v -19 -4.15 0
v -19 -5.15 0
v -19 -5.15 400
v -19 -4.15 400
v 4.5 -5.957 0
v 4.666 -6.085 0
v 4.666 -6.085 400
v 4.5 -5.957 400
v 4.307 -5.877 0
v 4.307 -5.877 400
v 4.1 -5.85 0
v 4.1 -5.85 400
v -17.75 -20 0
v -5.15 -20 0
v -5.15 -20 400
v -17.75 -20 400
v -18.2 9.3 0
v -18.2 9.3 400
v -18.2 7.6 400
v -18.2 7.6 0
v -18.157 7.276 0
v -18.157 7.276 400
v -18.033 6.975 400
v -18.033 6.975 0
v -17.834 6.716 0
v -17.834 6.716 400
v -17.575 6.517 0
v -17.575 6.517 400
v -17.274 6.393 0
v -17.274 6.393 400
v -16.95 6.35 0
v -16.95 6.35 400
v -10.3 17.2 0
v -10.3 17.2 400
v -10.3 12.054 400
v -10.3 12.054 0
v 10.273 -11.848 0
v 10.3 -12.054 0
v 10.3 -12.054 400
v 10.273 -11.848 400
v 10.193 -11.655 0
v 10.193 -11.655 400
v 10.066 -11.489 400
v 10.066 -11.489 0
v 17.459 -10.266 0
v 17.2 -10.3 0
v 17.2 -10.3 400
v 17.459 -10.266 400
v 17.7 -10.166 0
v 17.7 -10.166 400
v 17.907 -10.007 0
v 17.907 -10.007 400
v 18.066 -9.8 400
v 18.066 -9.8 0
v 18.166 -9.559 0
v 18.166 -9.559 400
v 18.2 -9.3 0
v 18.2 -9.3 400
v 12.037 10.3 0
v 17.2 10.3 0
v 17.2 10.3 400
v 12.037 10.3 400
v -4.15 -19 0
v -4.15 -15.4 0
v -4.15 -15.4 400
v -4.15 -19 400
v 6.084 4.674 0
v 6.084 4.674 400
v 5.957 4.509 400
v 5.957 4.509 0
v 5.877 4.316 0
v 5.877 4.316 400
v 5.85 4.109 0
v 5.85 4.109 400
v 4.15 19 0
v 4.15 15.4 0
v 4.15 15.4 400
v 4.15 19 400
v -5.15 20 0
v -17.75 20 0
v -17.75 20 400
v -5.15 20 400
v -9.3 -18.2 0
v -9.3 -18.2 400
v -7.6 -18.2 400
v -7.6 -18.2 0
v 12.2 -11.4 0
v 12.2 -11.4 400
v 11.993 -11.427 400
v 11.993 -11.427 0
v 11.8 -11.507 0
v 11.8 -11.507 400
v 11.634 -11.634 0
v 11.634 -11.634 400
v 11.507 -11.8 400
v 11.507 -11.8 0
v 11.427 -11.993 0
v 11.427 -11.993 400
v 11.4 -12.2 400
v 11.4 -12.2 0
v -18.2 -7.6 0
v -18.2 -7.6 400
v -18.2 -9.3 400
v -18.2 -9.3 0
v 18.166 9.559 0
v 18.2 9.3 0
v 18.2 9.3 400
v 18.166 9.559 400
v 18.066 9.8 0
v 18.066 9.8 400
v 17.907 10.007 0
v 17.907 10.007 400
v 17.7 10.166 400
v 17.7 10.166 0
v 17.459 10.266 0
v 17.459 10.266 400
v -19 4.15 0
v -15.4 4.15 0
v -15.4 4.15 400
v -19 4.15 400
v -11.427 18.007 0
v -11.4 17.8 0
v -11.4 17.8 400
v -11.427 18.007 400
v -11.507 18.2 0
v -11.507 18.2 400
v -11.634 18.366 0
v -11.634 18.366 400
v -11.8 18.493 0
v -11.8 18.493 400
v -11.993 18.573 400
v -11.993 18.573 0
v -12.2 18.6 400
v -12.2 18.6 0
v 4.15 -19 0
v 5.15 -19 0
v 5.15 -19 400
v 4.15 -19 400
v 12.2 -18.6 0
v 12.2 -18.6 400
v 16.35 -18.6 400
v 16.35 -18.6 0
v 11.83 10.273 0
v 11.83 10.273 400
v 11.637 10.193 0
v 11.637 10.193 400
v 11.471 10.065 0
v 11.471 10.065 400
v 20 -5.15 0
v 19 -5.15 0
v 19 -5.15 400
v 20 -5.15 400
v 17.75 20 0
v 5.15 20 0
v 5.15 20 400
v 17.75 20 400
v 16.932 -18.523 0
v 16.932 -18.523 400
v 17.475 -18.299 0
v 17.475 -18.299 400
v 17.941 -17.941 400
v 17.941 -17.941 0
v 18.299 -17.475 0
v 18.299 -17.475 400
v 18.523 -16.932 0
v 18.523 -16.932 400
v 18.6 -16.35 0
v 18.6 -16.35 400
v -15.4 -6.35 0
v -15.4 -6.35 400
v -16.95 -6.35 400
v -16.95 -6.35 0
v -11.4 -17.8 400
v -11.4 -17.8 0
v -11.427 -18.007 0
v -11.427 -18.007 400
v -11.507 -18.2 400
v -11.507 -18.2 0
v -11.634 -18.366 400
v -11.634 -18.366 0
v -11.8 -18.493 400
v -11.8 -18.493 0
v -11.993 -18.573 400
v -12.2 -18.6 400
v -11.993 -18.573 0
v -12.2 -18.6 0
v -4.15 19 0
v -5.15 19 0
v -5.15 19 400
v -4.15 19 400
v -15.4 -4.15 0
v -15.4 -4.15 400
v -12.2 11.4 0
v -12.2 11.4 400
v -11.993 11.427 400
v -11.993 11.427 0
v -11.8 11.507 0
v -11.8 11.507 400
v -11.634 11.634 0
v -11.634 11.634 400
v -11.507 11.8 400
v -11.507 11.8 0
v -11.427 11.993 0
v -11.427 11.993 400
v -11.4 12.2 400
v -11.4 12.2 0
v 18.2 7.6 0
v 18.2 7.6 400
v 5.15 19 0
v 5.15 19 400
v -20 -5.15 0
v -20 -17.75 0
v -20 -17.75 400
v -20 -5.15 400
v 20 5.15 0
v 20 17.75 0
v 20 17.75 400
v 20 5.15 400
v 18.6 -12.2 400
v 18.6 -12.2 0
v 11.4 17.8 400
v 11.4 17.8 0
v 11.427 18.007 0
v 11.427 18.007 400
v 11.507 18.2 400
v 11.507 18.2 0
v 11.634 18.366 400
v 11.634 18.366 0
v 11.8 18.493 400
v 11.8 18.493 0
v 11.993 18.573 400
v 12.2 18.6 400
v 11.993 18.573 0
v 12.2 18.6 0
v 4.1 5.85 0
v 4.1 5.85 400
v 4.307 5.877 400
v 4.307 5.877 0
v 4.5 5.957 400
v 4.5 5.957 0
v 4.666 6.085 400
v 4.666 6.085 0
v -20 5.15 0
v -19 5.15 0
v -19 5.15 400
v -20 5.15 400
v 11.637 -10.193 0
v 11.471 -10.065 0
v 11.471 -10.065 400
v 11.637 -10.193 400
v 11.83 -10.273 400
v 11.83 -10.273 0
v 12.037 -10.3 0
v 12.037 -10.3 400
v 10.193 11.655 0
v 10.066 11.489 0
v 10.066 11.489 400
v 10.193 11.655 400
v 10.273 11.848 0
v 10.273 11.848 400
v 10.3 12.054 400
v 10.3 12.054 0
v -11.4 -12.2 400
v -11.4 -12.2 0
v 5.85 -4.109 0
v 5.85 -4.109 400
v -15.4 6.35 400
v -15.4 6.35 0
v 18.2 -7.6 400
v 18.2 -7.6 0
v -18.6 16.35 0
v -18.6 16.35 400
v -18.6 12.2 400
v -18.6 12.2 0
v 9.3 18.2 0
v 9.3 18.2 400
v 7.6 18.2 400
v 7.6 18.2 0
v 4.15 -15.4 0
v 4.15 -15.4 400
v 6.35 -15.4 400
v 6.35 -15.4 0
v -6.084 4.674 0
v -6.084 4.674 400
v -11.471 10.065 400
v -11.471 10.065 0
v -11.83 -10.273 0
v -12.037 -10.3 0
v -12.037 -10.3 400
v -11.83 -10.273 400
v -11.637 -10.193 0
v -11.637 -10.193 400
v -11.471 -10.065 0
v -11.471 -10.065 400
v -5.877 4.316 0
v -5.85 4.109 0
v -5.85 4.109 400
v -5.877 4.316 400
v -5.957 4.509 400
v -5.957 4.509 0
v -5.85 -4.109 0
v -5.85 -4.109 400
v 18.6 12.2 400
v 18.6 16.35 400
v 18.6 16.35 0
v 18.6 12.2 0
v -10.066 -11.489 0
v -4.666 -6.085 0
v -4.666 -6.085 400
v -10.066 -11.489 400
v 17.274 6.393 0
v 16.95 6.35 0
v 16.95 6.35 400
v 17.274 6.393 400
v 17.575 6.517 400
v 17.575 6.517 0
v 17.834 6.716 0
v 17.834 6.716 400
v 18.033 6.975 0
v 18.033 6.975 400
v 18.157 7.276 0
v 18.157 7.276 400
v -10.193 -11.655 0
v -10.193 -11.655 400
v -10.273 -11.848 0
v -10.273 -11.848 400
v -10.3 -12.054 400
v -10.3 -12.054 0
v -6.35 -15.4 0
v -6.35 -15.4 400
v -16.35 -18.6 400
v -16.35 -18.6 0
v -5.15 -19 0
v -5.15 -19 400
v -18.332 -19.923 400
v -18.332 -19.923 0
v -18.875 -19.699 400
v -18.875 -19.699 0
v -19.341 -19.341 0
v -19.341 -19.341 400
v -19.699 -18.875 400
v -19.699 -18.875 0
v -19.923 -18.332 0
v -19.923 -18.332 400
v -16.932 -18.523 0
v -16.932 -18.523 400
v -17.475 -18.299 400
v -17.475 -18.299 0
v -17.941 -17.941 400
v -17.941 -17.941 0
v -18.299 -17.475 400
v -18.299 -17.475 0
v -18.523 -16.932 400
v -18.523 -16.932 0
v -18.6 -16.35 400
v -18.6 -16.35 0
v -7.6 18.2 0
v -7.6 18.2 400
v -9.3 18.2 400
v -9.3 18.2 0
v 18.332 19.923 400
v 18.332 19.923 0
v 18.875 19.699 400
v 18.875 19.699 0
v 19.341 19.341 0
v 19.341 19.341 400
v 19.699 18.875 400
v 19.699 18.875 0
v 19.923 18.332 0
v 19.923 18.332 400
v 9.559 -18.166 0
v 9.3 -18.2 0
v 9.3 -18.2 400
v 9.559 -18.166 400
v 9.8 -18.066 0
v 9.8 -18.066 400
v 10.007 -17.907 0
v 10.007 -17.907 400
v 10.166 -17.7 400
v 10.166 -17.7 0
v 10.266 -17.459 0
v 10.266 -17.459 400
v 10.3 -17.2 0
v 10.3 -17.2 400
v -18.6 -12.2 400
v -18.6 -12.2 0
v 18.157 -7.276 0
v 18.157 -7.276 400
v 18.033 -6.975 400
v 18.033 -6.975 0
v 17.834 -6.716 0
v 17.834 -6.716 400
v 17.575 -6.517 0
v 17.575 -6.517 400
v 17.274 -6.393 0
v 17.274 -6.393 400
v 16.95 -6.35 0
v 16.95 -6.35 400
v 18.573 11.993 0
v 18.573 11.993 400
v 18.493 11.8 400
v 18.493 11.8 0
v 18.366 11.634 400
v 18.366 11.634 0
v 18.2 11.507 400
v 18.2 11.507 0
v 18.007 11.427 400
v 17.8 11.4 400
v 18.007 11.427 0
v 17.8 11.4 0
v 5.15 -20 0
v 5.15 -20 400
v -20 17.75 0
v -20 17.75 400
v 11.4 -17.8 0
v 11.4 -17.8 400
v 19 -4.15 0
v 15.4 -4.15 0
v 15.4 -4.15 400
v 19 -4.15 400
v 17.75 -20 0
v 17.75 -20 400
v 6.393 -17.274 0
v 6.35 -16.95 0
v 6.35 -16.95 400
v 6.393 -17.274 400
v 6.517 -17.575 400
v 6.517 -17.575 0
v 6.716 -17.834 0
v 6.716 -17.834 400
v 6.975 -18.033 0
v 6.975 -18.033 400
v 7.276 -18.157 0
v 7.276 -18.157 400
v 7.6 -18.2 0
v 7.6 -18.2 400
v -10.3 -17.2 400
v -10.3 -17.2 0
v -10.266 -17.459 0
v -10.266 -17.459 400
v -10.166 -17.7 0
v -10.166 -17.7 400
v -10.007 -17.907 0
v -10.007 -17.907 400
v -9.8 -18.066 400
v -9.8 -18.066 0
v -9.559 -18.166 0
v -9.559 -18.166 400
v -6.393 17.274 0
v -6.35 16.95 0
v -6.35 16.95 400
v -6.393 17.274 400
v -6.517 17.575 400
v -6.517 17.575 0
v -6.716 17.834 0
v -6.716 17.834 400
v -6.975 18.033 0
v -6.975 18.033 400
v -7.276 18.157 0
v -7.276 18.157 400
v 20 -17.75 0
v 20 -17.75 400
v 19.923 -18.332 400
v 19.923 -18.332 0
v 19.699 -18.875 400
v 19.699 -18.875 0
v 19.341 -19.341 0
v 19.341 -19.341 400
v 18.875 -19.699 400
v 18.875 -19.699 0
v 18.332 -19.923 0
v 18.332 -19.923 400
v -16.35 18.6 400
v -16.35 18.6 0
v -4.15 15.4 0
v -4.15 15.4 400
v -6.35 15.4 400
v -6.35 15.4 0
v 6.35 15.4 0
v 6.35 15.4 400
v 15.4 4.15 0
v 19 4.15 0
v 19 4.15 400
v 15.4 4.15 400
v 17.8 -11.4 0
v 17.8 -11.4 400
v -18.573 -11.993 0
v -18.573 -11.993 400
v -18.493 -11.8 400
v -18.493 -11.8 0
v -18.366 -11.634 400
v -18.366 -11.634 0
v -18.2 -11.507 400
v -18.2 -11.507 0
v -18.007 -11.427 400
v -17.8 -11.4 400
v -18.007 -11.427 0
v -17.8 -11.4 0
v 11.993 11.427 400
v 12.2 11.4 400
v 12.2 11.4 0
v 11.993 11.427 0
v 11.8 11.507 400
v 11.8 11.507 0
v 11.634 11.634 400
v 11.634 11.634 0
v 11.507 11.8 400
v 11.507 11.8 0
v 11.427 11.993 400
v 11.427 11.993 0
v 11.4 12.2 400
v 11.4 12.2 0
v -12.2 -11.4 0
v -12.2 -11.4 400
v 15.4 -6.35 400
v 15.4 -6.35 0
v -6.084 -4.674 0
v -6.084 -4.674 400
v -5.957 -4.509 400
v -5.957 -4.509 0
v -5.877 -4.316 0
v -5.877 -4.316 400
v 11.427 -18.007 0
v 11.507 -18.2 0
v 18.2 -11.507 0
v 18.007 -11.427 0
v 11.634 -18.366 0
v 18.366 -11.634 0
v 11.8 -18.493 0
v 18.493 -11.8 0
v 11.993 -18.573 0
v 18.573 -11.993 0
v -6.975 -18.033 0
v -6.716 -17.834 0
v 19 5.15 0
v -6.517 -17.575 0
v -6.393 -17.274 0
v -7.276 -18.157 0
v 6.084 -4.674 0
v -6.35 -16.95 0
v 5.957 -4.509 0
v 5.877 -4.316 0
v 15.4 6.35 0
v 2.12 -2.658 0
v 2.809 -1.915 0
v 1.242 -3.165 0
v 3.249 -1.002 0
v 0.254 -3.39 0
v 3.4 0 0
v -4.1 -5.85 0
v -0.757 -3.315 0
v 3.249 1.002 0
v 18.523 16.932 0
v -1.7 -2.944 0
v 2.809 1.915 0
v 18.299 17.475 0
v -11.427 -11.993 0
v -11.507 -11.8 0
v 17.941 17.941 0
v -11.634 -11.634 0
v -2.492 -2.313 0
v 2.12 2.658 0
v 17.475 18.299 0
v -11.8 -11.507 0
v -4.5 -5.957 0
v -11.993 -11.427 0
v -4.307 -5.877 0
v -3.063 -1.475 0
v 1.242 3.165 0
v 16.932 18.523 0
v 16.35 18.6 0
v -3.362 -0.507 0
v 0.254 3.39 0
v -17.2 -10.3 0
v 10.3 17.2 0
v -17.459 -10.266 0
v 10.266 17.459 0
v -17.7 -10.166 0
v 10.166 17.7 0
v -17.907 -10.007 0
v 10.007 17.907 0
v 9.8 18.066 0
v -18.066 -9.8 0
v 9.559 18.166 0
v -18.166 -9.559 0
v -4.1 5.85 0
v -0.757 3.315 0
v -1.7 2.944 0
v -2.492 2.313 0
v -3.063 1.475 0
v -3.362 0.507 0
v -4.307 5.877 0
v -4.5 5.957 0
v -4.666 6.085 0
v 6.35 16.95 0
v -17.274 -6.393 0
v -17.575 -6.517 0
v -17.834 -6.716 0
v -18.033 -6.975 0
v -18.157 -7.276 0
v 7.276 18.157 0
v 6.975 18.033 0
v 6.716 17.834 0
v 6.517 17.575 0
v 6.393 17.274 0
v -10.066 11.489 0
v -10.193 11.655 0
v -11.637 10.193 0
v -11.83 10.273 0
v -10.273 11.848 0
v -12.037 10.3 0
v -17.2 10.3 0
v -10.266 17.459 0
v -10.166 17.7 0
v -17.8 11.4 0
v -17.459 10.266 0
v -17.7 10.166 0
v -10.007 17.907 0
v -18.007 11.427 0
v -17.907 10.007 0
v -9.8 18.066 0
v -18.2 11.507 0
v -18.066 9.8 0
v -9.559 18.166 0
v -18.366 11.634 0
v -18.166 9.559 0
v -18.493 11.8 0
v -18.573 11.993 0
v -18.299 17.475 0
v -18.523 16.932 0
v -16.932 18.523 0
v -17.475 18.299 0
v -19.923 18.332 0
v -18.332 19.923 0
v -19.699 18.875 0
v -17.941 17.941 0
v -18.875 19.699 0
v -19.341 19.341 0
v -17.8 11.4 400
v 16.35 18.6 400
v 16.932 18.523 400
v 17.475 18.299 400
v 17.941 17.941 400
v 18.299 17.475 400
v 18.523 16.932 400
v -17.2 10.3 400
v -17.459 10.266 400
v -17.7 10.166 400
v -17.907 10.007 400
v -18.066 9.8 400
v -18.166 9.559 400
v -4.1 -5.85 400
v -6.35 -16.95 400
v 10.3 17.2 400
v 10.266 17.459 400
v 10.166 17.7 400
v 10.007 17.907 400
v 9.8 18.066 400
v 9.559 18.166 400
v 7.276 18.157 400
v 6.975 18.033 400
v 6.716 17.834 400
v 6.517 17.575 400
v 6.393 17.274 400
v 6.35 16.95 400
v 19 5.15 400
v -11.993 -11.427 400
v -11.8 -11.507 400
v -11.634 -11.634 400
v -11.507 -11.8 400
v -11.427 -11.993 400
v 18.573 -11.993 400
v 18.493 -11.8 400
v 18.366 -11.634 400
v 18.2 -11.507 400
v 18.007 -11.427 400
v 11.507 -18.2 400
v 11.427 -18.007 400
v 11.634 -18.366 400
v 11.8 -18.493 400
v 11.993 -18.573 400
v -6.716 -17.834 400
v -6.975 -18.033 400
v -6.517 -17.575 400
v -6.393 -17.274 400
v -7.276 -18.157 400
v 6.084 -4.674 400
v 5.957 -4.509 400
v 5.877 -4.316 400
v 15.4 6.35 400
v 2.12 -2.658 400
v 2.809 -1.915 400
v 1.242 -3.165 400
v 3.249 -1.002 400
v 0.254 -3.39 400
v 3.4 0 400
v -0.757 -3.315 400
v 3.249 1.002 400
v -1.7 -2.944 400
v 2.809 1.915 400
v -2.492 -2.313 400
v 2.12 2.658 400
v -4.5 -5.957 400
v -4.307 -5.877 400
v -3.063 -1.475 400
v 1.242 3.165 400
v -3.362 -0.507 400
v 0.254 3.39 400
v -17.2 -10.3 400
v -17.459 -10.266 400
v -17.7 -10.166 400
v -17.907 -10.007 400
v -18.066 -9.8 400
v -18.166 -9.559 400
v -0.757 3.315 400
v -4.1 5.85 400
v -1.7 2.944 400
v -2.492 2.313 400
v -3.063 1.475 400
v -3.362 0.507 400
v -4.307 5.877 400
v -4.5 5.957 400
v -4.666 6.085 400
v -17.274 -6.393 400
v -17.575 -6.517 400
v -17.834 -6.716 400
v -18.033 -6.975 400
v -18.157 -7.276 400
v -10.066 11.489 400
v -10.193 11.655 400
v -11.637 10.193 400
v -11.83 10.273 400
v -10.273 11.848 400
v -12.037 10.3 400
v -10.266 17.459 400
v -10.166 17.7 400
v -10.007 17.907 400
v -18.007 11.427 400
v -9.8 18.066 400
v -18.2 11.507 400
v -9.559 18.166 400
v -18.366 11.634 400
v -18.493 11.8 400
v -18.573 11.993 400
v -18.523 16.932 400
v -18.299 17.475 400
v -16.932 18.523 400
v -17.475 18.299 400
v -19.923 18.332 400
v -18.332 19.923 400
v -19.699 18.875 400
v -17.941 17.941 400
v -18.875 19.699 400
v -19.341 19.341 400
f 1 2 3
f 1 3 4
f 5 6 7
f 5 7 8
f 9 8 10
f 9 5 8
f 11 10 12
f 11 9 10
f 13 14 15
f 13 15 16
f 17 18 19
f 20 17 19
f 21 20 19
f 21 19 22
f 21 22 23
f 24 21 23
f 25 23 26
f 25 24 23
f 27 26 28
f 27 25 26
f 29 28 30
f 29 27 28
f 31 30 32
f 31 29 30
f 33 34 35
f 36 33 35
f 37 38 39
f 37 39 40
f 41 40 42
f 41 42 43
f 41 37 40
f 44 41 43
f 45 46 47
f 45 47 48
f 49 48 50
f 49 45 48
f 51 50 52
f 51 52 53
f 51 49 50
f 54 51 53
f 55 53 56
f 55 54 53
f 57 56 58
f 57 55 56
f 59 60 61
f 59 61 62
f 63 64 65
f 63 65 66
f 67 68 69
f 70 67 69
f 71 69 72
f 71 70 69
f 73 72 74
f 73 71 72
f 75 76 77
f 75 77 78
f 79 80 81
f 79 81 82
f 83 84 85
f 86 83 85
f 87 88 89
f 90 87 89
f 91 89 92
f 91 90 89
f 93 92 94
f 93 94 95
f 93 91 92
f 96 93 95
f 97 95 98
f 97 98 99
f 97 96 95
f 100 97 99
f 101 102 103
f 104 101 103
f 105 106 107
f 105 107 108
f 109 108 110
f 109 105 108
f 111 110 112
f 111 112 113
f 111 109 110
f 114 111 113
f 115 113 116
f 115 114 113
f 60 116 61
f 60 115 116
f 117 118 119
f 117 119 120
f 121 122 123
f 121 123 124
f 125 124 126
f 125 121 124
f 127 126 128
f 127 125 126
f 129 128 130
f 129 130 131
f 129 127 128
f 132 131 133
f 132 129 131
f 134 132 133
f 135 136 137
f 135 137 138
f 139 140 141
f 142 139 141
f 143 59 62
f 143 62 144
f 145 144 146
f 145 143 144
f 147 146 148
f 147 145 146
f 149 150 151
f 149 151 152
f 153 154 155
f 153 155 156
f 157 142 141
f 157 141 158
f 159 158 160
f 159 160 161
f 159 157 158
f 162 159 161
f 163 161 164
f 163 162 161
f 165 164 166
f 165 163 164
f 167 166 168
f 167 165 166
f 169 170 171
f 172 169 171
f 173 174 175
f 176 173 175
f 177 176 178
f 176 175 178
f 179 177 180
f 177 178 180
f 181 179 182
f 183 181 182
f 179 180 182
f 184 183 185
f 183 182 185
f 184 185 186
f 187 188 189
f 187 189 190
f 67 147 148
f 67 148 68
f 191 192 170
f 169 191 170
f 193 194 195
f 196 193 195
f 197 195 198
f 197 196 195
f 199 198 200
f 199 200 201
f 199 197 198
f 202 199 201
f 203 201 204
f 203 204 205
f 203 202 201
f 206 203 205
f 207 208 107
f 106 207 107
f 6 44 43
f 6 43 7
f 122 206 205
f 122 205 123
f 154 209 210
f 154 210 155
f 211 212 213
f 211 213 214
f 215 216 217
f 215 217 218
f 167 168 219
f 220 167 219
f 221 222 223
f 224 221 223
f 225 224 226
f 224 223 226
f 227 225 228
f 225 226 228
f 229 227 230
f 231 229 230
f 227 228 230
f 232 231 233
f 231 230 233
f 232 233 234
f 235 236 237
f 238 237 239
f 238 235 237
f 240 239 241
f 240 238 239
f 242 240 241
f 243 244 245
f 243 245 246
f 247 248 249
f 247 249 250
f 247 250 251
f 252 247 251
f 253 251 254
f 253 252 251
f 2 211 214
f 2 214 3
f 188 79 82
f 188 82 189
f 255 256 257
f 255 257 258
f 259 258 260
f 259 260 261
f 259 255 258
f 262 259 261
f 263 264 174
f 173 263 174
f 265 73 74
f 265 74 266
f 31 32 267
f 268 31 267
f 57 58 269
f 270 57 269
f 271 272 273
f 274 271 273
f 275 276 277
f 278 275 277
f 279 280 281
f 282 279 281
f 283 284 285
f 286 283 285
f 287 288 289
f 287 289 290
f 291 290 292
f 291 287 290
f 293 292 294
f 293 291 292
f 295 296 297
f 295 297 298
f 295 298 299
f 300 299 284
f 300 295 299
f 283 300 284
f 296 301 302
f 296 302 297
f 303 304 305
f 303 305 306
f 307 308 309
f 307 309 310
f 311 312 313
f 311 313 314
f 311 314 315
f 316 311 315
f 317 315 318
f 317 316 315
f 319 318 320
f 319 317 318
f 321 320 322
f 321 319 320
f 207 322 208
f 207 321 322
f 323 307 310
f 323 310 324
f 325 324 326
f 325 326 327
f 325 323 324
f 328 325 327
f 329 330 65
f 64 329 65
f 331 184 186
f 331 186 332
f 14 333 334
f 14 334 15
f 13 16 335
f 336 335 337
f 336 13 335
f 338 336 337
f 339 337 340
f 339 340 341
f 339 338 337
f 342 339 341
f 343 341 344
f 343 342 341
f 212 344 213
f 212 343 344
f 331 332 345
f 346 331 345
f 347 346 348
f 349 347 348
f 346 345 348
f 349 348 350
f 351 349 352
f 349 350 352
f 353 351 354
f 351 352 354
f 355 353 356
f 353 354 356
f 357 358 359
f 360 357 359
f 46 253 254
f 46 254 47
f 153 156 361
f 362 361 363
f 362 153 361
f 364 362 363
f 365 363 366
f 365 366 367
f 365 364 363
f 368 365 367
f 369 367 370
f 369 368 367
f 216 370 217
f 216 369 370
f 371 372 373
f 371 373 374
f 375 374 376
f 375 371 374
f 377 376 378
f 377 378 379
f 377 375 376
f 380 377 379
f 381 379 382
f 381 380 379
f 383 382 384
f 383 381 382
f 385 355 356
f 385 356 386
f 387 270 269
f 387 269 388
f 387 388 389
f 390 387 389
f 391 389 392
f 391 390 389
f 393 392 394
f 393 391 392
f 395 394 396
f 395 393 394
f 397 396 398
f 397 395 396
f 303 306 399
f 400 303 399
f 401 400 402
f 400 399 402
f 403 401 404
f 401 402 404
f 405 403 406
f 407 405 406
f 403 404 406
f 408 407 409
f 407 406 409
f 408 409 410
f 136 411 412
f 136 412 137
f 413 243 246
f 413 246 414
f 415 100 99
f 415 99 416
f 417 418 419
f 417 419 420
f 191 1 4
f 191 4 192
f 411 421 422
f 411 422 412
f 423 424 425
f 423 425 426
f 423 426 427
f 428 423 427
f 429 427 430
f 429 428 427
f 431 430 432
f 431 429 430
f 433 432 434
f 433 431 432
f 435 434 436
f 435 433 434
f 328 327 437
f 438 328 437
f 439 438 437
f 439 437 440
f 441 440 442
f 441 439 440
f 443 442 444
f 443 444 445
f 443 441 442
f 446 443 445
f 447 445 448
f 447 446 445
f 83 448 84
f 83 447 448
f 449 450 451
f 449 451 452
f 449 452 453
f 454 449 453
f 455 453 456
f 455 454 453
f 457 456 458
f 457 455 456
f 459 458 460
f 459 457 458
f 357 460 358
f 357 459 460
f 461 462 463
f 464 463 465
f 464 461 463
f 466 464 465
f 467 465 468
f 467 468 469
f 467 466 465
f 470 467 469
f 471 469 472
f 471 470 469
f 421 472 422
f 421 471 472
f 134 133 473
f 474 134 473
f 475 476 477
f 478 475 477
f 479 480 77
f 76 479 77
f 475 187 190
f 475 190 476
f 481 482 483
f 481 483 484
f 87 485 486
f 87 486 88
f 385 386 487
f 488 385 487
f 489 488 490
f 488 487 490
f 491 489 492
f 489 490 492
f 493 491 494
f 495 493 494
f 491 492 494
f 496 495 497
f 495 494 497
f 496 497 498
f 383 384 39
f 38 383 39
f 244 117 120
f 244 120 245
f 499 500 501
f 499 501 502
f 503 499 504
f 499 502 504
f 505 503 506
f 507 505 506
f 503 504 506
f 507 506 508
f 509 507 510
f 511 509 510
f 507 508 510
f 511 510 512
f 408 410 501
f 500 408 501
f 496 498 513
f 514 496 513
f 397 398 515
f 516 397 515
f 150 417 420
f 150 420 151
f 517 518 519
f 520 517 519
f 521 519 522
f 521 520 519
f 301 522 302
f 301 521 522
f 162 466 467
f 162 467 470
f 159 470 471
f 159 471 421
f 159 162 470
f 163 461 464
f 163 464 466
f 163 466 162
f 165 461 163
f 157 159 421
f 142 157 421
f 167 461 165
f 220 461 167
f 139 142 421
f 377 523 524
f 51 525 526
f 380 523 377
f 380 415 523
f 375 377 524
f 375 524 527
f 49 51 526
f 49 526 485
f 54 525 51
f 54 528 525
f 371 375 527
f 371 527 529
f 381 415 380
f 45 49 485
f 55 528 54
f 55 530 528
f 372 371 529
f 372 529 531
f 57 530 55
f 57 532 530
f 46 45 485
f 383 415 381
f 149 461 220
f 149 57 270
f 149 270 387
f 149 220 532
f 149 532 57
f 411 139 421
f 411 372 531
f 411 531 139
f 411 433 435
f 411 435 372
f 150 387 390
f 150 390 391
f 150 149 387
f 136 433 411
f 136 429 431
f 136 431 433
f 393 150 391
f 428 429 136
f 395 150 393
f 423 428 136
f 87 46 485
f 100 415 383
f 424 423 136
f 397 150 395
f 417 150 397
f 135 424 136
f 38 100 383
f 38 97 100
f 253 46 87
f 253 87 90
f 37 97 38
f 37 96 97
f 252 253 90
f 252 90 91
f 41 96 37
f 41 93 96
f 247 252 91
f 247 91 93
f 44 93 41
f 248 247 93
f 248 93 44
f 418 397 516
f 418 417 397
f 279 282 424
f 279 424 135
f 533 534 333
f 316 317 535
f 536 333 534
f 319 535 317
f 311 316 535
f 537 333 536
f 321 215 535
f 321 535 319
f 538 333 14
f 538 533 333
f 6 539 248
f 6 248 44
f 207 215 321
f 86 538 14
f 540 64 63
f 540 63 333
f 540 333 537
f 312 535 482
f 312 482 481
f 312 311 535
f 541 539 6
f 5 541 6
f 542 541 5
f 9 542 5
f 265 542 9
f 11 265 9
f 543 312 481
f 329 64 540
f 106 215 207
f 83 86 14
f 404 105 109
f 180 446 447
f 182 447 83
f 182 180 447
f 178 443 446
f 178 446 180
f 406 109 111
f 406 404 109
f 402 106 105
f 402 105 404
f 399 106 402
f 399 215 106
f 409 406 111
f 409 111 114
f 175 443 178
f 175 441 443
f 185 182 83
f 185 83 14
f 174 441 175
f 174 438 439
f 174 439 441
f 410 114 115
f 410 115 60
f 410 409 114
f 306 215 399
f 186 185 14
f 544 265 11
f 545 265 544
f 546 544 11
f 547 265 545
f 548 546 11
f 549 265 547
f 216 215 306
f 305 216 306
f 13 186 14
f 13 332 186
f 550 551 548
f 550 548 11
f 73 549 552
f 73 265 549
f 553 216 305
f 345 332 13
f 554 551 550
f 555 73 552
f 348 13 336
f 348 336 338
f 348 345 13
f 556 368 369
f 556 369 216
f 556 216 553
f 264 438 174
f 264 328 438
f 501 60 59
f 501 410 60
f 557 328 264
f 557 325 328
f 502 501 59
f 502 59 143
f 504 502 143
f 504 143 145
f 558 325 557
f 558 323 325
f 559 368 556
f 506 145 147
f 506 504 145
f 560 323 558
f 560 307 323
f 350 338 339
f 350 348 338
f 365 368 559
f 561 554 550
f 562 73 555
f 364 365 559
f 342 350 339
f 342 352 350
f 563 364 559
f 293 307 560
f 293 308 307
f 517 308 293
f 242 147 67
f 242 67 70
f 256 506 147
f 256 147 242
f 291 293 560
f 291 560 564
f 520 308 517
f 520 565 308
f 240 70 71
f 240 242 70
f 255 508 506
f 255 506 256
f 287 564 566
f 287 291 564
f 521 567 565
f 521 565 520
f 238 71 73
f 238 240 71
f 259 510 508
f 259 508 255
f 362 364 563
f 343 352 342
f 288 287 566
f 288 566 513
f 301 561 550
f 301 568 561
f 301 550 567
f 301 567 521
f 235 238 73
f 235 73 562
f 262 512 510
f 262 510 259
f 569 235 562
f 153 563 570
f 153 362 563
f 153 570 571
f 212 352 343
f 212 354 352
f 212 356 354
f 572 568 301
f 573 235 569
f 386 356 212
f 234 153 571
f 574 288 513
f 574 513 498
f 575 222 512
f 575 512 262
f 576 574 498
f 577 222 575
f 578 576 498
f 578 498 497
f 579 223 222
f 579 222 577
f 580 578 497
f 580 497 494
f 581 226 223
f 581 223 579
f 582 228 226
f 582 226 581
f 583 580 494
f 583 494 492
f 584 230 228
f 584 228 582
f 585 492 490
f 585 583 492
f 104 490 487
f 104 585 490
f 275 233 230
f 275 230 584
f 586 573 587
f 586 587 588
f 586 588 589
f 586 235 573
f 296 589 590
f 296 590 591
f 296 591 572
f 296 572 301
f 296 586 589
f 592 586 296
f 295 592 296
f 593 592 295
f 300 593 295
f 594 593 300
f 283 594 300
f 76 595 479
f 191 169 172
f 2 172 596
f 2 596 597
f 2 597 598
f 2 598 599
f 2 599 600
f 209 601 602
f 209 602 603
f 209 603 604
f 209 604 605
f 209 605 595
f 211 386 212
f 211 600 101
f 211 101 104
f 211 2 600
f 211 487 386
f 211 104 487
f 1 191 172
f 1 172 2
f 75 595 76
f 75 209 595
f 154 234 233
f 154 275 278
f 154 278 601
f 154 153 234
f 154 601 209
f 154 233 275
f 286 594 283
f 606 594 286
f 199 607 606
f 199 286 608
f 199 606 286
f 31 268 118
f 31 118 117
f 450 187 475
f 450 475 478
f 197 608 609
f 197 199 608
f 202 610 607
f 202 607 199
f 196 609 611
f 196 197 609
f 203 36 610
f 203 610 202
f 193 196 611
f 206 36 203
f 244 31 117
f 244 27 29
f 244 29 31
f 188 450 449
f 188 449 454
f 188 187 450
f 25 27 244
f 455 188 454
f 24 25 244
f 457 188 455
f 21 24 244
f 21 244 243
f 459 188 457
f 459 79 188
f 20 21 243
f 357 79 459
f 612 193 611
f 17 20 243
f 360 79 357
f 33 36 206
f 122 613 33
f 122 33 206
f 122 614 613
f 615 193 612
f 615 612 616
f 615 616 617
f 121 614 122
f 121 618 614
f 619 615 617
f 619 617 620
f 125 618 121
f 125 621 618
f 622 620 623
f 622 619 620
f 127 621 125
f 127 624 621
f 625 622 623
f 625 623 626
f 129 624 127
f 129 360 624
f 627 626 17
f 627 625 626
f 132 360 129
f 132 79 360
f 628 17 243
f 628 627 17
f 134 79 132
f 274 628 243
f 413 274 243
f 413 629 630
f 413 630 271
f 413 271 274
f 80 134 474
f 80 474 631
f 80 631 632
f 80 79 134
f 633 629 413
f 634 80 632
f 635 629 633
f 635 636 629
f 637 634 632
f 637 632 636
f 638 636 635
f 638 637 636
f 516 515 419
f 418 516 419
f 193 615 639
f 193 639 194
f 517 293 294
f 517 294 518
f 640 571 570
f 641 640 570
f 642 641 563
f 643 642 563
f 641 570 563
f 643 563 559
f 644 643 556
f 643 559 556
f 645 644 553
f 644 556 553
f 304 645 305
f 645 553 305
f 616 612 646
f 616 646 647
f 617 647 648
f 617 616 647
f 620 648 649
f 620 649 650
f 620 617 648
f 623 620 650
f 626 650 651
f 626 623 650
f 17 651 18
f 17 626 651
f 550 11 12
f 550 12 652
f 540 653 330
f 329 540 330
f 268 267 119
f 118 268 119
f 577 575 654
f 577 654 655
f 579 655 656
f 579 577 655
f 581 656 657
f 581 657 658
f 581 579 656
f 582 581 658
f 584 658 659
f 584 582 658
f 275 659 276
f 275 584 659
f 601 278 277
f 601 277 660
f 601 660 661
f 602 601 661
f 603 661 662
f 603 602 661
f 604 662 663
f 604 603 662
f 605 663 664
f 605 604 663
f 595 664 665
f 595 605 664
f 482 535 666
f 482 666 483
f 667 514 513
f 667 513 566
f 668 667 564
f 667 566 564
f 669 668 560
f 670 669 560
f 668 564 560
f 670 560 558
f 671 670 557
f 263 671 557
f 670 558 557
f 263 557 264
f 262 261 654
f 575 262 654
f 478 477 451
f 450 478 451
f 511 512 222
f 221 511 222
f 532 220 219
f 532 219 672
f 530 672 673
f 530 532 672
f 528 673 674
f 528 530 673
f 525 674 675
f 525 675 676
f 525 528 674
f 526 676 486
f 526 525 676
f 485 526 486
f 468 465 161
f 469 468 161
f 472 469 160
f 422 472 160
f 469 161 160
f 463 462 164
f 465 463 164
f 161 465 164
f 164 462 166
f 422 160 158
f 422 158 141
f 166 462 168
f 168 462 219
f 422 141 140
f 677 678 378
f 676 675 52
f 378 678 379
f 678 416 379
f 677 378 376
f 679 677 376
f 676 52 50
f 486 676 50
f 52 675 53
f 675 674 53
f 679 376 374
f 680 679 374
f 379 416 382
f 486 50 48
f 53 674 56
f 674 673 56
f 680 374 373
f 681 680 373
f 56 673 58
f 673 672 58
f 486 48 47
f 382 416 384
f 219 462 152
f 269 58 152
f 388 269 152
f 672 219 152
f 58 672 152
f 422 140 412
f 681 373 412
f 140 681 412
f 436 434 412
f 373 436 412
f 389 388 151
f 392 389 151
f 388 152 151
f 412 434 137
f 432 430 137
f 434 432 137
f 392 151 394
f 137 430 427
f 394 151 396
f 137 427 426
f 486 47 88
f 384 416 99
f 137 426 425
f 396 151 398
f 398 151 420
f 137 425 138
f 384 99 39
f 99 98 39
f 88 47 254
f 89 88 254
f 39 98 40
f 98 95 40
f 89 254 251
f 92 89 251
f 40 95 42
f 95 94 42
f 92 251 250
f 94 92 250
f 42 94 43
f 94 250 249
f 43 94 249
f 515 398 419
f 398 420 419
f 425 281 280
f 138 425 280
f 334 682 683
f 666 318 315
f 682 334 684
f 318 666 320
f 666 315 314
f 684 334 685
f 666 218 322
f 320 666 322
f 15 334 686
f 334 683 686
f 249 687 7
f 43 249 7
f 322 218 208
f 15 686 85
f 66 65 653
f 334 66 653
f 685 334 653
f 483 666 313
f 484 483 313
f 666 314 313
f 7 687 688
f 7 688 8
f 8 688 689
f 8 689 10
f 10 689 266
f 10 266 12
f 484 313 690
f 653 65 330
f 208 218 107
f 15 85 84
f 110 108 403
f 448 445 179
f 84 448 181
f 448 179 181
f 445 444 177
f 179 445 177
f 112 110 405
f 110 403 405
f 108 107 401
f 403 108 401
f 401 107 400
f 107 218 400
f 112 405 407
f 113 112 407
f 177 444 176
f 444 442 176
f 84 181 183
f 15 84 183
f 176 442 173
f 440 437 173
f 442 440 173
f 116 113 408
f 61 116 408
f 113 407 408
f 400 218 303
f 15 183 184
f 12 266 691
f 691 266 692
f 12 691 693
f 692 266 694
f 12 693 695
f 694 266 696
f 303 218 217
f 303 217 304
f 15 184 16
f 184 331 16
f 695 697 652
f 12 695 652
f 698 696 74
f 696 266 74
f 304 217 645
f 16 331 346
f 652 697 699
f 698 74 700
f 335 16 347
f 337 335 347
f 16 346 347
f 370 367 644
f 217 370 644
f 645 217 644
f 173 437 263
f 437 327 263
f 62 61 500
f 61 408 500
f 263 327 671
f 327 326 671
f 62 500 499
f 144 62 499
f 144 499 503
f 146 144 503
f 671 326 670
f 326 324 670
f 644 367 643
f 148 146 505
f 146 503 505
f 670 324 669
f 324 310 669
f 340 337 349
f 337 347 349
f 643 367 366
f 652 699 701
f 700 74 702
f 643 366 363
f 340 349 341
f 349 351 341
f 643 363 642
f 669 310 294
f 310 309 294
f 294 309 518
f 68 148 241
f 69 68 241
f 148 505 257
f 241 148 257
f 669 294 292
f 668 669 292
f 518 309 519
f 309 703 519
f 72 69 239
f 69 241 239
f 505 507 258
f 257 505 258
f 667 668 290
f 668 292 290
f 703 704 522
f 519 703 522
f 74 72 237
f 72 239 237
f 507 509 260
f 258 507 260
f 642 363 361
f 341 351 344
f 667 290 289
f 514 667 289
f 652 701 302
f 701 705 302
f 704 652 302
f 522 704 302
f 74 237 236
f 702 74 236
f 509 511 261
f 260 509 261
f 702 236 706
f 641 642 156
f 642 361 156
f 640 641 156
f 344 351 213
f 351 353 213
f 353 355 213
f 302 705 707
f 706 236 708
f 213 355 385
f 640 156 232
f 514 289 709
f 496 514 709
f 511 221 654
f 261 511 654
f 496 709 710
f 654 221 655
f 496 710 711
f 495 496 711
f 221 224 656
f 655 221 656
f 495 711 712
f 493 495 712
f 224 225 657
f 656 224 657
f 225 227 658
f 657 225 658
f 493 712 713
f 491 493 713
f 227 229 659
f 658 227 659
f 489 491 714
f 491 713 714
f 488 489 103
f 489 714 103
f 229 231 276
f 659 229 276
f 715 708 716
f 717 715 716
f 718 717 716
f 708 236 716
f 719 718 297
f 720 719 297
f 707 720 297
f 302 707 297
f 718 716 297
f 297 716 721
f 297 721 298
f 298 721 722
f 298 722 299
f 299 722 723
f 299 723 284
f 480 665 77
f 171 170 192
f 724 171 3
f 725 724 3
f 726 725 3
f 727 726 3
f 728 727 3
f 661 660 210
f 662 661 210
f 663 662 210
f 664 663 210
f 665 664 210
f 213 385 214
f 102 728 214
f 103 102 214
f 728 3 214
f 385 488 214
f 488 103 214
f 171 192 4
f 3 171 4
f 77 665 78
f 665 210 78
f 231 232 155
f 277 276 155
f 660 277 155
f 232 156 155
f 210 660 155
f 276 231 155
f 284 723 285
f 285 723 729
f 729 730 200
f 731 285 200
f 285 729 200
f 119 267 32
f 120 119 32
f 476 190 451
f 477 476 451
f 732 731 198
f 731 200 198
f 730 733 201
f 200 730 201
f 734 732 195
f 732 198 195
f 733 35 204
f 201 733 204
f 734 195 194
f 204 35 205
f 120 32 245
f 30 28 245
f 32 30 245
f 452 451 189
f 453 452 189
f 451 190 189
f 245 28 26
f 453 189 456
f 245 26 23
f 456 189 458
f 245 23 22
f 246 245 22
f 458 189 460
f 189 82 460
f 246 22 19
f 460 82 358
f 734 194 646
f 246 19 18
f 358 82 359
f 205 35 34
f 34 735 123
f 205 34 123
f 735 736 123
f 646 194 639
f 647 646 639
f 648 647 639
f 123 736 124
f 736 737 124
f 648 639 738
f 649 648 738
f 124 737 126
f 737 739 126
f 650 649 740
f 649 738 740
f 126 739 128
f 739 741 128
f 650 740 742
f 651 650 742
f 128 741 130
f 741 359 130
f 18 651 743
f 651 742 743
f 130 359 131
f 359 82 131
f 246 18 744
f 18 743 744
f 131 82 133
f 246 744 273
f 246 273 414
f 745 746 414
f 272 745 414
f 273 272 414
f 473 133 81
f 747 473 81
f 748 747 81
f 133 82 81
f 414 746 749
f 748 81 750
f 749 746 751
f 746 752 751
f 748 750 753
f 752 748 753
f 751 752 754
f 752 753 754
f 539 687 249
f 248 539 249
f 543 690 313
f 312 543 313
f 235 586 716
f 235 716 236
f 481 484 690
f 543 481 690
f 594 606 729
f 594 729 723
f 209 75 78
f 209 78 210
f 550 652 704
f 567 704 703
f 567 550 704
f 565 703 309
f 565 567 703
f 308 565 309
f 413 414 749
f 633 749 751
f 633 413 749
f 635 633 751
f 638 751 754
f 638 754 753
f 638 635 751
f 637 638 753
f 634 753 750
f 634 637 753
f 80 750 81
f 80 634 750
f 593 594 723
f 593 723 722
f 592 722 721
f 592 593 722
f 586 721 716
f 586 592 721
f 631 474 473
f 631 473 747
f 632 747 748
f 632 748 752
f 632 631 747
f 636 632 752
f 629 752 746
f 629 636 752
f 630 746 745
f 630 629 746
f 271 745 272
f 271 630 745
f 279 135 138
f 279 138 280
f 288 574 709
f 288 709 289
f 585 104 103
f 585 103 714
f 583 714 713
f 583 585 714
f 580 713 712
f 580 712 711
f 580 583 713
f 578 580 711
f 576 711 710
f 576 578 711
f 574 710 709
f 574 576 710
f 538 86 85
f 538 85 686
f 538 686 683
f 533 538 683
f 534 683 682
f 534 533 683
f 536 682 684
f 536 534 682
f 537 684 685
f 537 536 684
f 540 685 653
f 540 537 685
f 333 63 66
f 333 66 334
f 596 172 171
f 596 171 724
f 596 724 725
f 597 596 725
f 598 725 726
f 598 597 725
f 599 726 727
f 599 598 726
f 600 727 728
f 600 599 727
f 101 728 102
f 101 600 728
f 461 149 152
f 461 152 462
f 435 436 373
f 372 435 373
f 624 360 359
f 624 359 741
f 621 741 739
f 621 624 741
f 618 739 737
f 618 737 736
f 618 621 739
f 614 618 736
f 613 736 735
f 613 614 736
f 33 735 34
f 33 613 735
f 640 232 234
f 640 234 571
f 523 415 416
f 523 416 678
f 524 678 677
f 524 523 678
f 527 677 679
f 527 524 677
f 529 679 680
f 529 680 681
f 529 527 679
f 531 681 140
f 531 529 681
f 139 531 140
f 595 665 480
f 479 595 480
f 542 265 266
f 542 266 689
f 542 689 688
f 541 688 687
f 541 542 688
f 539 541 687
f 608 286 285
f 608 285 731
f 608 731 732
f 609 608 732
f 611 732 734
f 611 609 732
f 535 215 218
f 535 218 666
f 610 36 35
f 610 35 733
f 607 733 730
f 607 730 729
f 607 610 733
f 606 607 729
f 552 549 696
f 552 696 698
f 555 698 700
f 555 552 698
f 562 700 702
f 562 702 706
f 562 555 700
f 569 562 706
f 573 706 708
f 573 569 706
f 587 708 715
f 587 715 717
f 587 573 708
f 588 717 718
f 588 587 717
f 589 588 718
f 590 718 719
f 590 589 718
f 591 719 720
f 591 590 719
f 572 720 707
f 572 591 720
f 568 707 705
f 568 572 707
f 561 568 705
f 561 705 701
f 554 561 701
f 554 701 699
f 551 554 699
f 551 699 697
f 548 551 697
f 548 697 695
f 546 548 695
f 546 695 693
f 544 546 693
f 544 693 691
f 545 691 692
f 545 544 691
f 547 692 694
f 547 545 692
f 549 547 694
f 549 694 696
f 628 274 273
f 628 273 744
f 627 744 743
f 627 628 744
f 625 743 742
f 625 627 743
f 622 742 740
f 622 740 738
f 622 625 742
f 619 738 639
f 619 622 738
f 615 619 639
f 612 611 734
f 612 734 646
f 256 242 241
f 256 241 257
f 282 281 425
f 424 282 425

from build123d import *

# Parameters (mm, degrees)
SKETCH1_R           = 3.4
BOSS_EXTRUDE1_DEPTH = 400


with BuildPart() as part:
    # Sketch1 → Boss-Extrude1 (new body)
    with BuildSketch(Plane.XY):
        with BuildLine():
            Line((20, 17.75), (20, 5.15))
            Line((20, 5.15), (19, 5.15))
            Line((19, 5.15), (19, 4.15))
            Line((19, 4.15), (15.4, 4.15))
            Line((15.4, 4.15), (15.4, 6.35))
            Line((15.4, 6.35), (16.95, 6.35))
            ThreePointArc((16.95, 6.35), (17.833883476, 6.716116524), (18.2, 7.6))
            Line((18.2, 7.6), (18.2, 9.3))
            ThreePointArc((18.2, 9.3), (17.907106781, 10.007106781), (17.2, 10.3))
            Line((17.2, 10.3), (12.03669957, 10.3))
            ThreePointArc((12.03669957, 10.3), (11.73040037, 10.239040459), (11.470780817, 10.065452001))
            Line((11.470780817, 10.065452001), (6.084081247, 4.674305984))
            ThreePointArc((6.084081247, 4.674305984), (5.910833239, 4.414848262), (5.85, 4.108853983))
            Line((5.85, 4.108853983), (5.85, -4.108853983))
            ThreePointArc((5.85, -4.108853983), (5.910833239, -4.414848262), (6.084081247, -4.674305984))
            Line((6.084081247, -4.674305984), (11.470780817, -10.065452001))
            ThreePointArc((11.470780817, -10.065452001), (11.73040037, -10.239040459), (12.03669957, -10.3))
            Line((12.03669957, -10.3), (17.2, -10.3))
            ThreePointArc((17.2, -10.3), (17.907106781, -10.007106781), (18.2, -9.3))
            Line((18.2, -9.3), (18.2, -7.6))
            ThreePointArc((18.2, -7.6), (17.833883476, -6.716116524), (16.95, -6.35))
            Line((16.95, -6.35), (15.4, -6.35))
            Line((15.4, -6.35), (15.4, -4.15))
            Line((15.4, -4.15), (19, -4.15))
            Line((19, -4.15), (19, -5.15))
            Line((19, -5.15), (20, -5.15))
            Line((20, -5.15), (20, -17.75))
            ThreePointArc((20, -17.75), (19.340990258, -19.340990258), (17.75, -20))
            Line((17.75, -20), (5.15, -20))
            Line((5.15, -20), (5.15, -19))
            Line((5.15, -19), (4.15, -19))
            Line((4.15, -19), (4.15, -15.4))
            Line((4.15, -15.4), (6.35, -15.4))
            Line((6.35, -15.4), (6.35, -16.95))
            ThreePointArc((6.35, -16.95), (6.716116524, -17.833883476), (7.6, -18.2))
            Line((7.6, -18.2), (9.3, -18.2))
            ThreePointArc((9.3, -18.2), (10.007106781, -17.907106781), (10.3, -17.2))
            Line((10.3, -17.2), (10.3, -12.054477022))
            ThreePointArc((10.3, -12.054477022), (10.239166761, -11.748482743), (10.065918753, -11.489025021))
            Line((10.065918753, -11.489025021), (4.665899173, -6.084547999))
            ThreePointArc((4.665899173, -6.084547999), (4.406279619, -5.910959541), (4.09998042, -5.85))
            Line((4.09998042, -5.85), (-4.09998042, -5.85))
            ThreePointArc((-4.09998042, -5.85), (-4.406279619, -5.910959541), (-4.665899173, -6.084547999))
            Line((-4.665899173, -6.084547999), (-10.065918753, -11.489025021))
            ThreePointArc((-10.065918753, -11.489025021), (-10.239166761, -11.748482743), (-10.3, -12.054477022))
            Line((-10.3, -12.054477022), (-10.3, -17.2))
            ThreePointArc((-10.3, -17.2), (-10.007106781, -17.907106781), (-9.3, -18.2))
            Line((-9.3, -18.2), (-7.6, -18.2))
            ThreePointArc((-7.6, -18.2), (-6.716116524, -17.833883476), (-6.35, -16.95))
            Line((-6.35, -16.95), (-6.35, -15.4))
            Line((-6.35, -15.4), (-4.15, -15.4))
            Line((-4.15, -15.4), (-4.15, -19))
            Line((-4.15, -19), (-5.15, -19))
            Line((-5.15, -19), (-5.15, -20))
            Line((-5.15, -20), (-17.75, -20))
            ThreePointArc((-17.75, -20), (-19.340990258, -19.340990258), (-20, -17.75))
            Line((-20, -17.75), (-20, -5.15))
            Line((-20, -5.15), (-19, -5.15))
            Line((-19, -5.15), (-19, -4.15))
            Line((-19, -4.15), (-15.4, -4.15))
            Line((-15.4, -4.15), (-15.4, -6.35))
            Line((-15.4, -6.35), (-16.95, -6.35))
            ThreePointArc((-16.95, -6.35), (-17.833883476, -6.716116524), (-18.2, -7.6))
            Line((-18.2, -7.6), (-18.2, -9.3))
            ThreePointArc((-18.2, -9.3), (-17.907106781, -10.007106781), (-17.2, -10.3))
            Line((-17.2, -10.3), (-12.03669957, -10.3))
            ThreePointArc((-12.03669957, -10.3), (-11.73040037, -10.239040459), (-11.470780817, -10.065452001))
            Line((-11.470780817, -10.065452001), (-6.084081247, -4.674305984))
            ThreePointArc((-6.084081247, -4.674305984), (-5.910833239, -4.414848262), (-5.85, -4.108853983))
            Line((-5.85, -4.108853983), (-5.85, 4.108853983))
            ThreePointArc((-5.85, 4.108853983), (-5.910833239, 4.414848262), (-6.084081247, 4.674305984))
            Line((-6.084081247, 4.674305984), (-11.470780817, 10.065452001))
            ThreePointArc((-11.470780817, 10.065452001), (-11.73040037, 10.239040459), (-12.03669957, 10.3))
            Line((-12.03669957, 10.3), (-17.2, 10.3))
            ThreePointArc((-17.2, 10.3), (-17.907106781, 10.007106781), (-18.2, 9.3))
            Line((-18.2, 9.3), (-18.2, 7.6))
            ThreePointArc((-18.2, 7.6), (-17.833883476, 6.716116524), (-16.95, 6.35))
            Line((-16.95, 6.35), (-15.4, 6.35))
            Line((-15.4, 6.35), (-15.4, 4.15))
            Line((-15.4, 4.15), (-19, 4.15))
            Line((-19, 4.15), (-19, 5.15))
            Line((-19, 5.15), (-20, 5.15))
            Line((-20, 5.15), (-20, 17.75))
            ThreePointArc((-20, 17.75), (-19.340990258, 19.340990258), (-17.75, 20))
            Line((-17.75, 20), (-5.15, 20))
            Line((-5.15, 20), (-5.15, 19))
            Line((-5.15, 19), (-4.15, 19))
            Line((-4.15, 19), (-4.15, 15.4))
            Line((-4.15, 15.4), (-6.35, 15.4))
            Line((-6.35, 15.4), (-6.35, 16.95))
            ThreePointArc((-6.35, 16.95), (-6.716116524, 17.833883476), (-7.6, 18.2))
            Line((-7.6, 18.2), (-9.3, 18.2))
            ThreePointArc((-9.3, 18.2), (-10.007106781, 17.907106781), (-10.3, 17.2))
            Line((-10.3, 17.2), (-10.3, 12.054477022))
            ThreePointArc((-10.3, 12.054477022), (-10.239166761, 11.748482743), (-10.065918753, 11.489025021))
            Line((-10.065918753, 11.489025021), (-4.665899173, 6.084547999))
            ThreePointArc((-4.665899173, 6.084547999), (-4.406279619, 5.910959541), (-4.09998042, 5.85))
            Line((-4.09998042, 5.85), (4.09998042, 5.85))
            ThreePointArc((4.09998042, 5.85), (4.406279619, 5.910959541), (4.665899173, 6.084547999))
            Line((4.665899173, 6.084547999), (10.065918753, 11.489025021))
            ThreePointArc((10.065918753, 11.489025021), (10.239166761, 11.748482743), (10.3, 12.054477022))
            Line((10.3, 12.054477022), (10.3, 17.2))
            ThreePointArc((10.3, 17.2), (10.007106781, 17.907106781), (9.3, 18.2))
            Line((9.3, 18.2), (7.6, 18.2))
            ThreePointArc((7.6, 18.2), (6.716116524, 17.833883476), (6.35, 16.95))
            Line((6.35, 16.95), (6.35, 15.4))
            Line((6.35, 15.4), (4.15, 15.4))
            Line((4.15, 15.4), (4.15, 19))
            Line((4.15, 19), (5.15, 19))
            Line((5.15, 19), (5.15, 20))
            Line((5.15, 20), (17.75, 20))
            ThreePointArc((17.75, 20), (19.340990258, 19.340990258), (20, 17.75))
        make_face()
        Circle(SKETCH1_R, mode=Mode.SUBTRACT)
        with BuildLine():
            Line((18.6, 16.35), (18.6, 12.2))
            ThreePointArc((18.6, 12.2), (18.365685425, 11.634314575), (17.8, 11.4))
            Line((17.8, 11.4), (12.2, 11.4))
            ThreePointArc((12.2, 11.4), (11.634314575, 11.634314575), (11.4, 12.2))
            Line((11.4, 12.2), (11.4, 17.8))
            ThreePointArc((11.4, 17.8), (11.634314575, 18.365685425), (12.2, 18.6))
            Line((12.2, 18.6), (16.35, 18.6))
            ThreePointArc((16.35, 18.6), (17.940990258, 17.940990258), (18.6, 16.35))
        make_face(mode=Mode.SUBTRACT)
        with BuildLine():
            Line((-12.2, 18.6), (-16.35, 18.6))
            ThreePointArc((-16.35, 18.6), (-17.940990258, 17.940990258), (-18.6, 16.35))
            Line((-18.6, 16.35), (-18.6, 12.2))
            ThreePointArc((-18.6, 12.2), (-18.365685425, 11.634314575), (-17.8, 11.4))
            Line((-17.8, 11.4), (-12.2, 11.4))
            ThreePointArc((-12.2, 11.4), (-11.634314575, 11.634314575), (-11.4, 12.2))
            Line((-11.4, 12.2), (-11.4, 17.8))
            ThreePointArc((-11.4, 17.8), (-11.634314575, 18.365685425), (-12.2, 18.6))
        make_face(mode=Mode.SUBTRACT)
        with BuildLine():
            Line((-18.6, -16.35), (-18.6, -12.2))
            ThreePointArc((-18.6, -12.2), (-18.365685425, -11.634314575), (-17.8, -11.4))
            Line((-17.8, -11.4), (-12.2, -11.4))
            ThreePointArc((-12.2, -11.4), (-11.634314575, -11.634314575), (-11.4, -12.2))
            Line((-11.4, -12.2), (-11.4, -17.8))
            ThreePointArc((-11.4, -17.8), (-11.634314575, -18.365685425), (-12.2, -18.6))
            Line((-12.2, -18.6), (-16.35, -18.6))
            ThreePointArc((-16.35, -18.6), (-17.940990258, -17.940990258), (-18.6, -16.35))
        make_face(mode=Mode.SUBTRACT)
        with BuildLine():
            Line((12.2, -18.6), (16.35, -18.6))
            ThreePointArc((16.35, -18.6), (17.940990258, -17.940990258), (18.6, -16.35))
            Line((18.6, -16.35), (18.6, -12.2))
            ThreePointArc((18.6, -12.2), (18.365685425, -11.634314575), (17.8, -11.4))
            Line((17.8, -11.4), (12.2, -11.4))
            ThreePointArc((12.2, -11.4), (11.634314575, -11.634314575), (11.4, -12.2))
            Line((11.4, -12.2), (11.4, -17.8))
            ThreePointArc((11.4, -17.8), (11.634314575, -18.365685425), (12.2, -18.6))
        make_face(mode=Mode.SUBTRACT)
    extrude(amount=BOSS_EXTRUDE1_DEPTH)


solid = part.part
